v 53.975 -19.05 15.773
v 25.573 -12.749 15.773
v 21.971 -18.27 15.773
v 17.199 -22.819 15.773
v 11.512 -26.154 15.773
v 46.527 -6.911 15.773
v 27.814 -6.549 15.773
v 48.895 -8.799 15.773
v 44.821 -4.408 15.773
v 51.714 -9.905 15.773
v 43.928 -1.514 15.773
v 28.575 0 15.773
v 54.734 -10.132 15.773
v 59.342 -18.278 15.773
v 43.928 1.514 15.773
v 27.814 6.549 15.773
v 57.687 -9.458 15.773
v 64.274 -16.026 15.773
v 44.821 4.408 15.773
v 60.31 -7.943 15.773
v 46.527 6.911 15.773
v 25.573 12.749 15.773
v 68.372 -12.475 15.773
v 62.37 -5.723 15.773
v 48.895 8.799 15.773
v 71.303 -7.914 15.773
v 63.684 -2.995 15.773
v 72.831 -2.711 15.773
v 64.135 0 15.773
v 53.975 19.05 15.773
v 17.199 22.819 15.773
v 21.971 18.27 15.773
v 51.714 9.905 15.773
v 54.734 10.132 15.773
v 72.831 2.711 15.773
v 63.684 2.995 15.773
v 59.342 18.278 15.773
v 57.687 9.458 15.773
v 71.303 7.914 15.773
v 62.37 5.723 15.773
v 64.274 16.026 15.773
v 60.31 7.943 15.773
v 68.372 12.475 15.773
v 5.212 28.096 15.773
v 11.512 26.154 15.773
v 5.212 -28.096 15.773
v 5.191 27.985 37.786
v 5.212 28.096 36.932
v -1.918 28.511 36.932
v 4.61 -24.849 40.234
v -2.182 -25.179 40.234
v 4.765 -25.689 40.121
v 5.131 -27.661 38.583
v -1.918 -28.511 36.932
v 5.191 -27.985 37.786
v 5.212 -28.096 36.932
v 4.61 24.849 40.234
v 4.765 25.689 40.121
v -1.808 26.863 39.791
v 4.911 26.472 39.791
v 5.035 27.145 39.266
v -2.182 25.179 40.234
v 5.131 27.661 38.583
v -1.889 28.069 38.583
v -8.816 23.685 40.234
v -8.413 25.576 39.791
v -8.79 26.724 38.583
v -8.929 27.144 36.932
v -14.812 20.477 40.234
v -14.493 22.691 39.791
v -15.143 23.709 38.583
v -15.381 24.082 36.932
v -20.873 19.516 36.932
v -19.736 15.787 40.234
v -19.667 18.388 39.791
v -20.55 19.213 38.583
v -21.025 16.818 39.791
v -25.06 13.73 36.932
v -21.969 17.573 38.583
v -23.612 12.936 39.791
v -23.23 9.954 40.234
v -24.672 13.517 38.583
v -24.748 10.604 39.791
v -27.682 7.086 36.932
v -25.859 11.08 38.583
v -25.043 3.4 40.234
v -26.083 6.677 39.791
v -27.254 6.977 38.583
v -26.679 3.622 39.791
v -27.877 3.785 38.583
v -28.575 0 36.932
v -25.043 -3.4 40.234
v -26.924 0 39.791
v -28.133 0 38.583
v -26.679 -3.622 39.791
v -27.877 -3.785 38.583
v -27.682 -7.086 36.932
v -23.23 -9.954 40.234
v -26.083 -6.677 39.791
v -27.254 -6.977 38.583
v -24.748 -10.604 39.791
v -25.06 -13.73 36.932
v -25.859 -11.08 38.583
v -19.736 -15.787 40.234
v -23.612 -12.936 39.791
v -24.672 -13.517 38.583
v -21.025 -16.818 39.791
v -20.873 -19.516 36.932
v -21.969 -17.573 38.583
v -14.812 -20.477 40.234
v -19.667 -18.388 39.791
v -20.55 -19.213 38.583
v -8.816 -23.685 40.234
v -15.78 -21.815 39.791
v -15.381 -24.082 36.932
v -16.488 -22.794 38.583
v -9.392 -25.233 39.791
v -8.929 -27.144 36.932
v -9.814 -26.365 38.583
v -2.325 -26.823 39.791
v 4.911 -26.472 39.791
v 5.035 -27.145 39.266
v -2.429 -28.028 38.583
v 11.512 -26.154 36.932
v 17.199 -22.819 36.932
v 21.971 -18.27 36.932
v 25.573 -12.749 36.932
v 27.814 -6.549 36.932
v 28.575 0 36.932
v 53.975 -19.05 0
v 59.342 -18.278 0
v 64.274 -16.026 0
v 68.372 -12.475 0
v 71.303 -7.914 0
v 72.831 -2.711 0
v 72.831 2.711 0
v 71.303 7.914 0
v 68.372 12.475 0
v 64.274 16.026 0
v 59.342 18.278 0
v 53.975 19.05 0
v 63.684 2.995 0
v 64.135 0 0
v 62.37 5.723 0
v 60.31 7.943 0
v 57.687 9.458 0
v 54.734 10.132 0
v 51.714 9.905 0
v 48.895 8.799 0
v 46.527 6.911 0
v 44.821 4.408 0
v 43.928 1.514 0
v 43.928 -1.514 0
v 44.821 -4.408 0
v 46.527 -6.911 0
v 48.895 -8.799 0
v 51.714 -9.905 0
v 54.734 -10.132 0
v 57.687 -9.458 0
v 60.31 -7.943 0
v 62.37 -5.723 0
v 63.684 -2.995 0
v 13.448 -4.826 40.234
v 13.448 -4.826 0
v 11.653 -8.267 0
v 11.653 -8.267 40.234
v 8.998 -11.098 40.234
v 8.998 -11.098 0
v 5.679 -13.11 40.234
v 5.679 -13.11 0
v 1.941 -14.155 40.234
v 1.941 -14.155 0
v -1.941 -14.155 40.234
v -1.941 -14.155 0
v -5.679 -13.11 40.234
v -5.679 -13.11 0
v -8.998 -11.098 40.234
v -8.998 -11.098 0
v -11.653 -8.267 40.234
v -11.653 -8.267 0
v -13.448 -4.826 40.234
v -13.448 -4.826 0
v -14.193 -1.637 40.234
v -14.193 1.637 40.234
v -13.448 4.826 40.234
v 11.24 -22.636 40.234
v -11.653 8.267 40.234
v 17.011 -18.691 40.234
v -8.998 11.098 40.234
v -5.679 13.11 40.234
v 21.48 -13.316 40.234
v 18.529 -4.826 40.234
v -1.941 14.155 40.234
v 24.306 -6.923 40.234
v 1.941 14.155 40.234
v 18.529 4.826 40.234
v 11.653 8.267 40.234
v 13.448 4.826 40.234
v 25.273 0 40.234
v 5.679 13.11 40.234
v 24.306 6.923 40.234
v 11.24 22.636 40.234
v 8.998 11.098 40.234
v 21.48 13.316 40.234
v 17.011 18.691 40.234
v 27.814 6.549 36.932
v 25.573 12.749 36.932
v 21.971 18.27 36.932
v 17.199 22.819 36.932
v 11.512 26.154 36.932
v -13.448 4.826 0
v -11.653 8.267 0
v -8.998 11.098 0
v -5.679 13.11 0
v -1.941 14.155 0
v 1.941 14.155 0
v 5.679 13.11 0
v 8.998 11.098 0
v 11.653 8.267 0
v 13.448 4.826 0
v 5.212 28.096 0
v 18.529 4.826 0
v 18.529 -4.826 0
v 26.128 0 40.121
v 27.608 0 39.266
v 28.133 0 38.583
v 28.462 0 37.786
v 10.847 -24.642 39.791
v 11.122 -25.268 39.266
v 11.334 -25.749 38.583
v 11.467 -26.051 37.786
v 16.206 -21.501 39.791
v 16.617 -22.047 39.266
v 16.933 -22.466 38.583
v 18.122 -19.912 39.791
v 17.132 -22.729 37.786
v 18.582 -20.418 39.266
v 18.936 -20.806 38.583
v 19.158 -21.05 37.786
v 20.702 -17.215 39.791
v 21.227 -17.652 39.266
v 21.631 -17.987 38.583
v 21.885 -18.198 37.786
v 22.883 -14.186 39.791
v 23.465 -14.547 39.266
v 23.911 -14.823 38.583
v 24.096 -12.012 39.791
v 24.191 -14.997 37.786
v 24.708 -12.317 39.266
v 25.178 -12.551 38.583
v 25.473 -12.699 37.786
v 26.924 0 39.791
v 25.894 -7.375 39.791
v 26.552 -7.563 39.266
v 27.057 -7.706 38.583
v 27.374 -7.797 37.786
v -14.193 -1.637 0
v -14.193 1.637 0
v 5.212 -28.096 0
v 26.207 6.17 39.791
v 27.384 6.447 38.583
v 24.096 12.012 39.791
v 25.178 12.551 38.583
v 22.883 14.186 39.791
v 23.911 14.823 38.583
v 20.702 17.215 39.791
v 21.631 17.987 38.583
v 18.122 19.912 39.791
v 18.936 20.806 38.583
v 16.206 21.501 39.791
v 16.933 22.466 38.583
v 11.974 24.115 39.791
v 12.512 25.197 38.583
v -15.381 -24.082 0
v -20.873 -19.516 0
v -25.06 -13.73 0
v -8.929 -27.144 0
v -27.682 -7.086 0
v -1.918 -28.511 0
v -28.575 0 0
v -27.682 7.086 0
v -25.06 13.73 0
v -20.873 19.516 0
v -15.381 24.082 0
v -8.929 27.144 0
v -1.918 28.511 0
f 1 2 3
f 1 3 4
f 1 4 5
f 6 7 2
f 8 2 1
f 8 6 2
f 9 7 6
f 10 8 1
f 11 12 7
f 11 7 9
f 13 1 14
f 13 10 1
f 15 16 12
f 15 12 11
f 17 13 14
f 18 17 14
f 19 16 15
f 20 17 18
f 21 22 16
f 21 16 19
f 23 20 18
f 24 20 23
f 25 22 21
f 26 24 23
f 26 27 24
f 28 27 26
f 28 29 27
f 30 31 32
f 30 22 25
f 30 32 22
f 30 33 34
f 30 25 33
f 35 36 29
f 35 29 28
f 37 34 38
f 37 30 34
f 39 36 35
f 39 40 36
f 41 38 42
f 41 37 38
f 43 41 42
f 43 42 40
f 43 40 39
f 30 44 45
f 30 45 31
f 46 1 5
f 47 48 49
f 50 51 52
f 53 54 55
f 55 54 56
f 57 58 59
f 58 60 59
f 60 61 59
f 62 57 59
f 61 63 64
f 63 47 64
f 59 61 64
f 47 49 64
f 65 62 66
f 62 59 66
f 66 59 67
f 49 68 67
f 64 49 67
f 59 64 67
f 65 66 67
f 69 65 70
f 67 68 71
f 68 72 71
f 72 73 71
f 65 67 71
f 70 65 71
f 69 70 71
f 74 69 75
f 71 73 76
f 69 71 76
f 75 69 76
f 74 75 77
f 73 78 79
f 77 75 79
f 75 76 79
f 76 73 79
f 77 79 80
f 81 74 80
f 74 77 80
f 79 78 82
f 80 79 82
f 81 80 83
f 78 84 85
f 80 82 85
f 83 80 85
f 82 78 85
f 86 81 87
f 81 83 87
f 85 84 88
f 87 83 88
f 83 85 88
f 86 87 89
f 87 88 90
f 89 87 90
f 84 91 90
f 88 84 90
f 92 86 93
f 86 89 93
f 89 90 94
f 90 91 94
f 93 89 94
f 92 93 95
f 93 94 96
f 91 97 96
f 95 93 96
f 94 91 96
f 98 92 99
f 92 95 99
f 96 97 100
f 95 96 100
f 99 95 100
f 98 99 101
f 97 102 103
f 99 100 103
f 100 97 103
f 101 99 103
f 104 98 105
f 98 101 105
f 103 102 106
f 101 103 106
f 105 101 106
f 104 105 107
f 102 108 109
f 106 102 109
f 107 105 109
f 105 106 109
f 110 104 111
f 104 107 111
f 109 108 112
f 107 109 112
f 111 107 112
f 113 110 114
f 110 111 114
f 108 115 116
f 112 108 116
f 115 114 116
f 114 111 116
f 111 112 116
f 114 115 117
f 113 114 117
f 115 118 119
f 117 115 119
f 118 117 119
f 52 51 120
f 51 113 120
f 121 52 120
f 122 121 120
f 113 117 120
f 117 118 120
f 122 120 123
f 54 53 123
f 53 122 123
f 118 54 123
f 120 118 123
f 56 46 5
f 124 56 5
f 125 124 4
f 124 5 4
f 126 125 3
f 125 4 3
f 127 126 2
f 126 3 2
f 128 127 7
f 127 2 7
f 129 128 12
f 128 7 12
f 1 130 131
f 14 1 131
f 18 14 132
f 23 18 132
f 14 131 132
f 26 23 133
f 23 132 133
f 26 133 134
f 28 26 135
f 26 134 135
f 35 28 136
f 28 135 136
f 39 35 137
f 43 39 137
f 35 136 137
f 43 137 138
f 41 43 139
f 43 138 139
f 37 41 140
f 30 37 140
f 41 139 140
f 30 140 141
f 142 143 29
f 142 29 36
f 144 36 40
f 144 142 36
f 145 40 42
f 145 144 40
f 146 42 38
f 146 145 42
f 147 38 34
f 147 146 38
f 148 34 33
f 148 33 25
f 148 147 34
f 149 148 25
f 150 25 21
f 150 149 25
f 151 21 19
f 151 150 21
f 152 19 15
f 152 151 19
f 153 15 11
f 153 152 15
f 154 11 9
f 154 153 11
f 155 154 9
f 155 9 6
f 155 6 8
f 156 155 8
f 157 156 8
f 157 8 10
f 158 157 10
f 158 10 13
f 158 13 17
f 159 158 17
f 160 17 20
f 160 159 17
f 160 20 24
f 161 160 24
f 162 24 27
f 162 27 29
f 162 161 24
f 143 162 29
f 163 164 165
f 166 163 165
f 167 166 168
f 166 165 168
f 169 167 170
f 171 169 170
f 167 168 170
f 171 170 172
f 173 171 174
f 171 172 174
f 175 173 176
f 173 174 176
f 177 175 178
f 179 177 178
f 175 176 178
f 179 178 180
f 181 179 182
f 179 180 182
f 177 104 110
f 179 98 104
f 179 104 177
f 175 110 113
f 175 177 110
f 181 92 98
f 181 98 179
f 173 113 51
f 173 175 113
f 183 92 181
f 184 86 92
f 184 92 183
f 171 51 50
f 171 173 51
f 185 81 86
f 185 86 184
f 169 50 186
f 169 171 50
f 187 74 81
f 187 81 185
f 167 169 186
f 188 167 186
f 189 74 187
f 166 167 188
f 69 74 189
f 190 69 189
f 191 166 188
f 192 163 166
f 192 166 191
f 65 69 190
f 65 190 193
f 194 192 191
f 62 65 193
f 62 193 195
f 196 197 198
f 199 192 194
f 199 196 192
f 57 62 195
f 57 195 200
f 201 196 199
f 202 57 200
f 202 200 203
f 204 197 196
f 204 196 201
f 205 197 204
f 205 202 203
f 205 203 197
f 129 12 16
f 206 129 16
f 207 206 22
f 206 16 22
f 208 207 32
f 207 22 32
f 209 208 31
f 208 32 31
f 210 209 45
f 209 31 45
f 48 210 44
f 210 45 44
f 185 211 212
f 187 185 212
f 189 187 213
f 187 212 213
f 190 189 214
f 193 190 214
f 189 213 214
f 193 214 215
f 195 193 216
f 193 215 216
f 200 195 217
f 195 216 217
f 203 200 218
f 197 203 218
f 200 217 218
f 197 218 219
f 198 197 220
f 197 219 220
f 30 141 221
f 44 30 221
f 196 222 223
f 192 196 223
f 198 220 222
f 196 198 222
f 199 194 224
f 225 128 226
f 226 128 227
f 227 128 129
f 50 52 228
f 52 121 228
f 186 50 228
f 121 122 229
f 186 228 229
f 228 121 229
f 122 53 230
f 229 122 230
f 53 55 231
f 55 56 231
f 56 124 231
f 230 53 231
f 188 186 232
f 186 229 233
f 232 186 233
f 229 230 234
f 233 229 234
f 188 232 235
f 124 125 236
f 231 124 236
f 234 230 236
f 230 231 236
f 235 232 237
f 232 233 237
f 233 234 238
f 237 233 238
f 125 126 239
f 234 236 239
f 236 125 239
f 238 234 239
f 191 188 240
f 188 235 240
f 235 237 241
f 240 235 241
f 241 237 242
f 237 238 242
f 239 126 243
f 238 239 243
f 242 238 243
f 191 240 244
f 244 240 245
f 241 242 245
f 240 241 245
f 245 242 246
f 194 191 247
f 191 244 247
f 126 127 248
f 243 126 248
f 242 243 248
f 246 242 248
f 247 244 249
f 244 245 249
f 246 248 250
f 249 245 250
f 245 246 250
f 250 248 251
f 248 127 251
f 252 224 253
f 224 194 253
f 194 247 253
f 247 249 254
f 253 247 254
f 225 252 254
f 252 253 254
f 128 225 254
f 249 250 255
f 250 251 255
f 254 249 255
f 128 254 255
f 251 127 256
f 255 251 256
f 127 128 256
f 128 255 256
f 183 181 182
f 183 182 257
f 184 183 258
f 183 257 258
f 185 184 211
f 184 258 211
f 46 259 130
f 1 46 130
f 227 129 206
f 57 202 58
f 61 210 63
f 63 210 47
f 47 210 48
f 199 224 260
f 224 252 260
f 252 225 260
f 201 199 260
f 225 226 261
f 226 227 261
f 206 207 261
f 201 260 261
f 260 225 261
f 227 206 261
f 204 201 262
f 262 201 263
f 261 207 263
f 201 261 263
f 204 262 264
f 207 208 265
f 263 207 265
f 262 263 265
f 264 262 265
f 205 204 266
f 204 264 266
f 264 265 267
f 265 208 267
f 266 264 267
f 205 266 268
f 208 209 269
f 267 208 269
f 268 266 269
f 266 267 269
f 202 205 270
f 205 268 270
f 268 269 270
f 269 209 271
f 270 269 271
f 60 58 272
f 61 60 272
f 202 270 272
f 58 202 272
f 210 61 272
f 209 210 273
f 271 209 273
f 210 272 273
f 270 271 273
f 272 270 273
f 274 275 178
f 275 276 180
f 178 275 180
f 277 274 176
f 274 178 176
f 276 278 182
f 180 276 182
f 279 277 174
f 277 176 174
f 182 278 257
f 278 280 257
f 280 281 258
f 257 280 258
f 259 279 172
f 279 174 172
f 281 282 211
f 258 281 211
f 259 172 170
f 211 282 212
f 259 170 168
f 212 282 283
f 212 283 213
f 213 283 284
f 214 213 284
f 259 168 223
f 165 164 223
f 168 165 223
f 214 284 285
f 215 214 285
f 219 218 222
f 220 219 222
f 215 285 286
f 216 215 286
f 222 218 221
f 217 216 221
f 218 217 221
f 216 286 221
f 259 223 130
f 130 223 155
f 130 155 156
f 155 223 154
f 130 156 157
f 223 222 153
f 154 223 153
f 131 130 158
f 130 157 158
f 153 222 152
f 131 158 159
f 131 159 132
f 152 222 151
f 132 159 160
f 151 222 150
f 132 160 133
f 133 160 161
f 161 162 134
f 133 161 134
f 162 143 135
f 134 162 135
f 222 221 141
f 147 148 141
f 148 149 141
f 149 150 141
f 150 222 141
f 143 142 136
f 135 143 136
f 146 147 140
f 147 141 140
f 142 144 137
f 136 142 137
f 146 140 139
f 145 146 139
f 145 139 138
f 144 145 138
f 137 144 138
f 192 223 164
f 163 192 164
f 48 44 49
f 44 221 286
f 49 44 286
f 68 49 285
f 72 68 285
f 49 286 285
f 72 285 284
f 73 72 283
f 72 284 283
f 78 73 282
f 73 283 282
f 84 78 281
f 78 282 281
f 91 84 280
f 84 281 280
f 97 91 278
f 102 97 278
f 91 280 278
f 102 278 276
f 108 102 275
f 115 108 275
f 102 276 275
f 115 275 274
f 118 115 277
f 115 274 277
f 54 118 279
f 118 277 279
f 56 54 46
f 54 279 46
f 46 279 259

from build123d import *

# Parameters (mm, degrees)
F1_DEPTH = 40.2336
F0_R     = 10.16
F2_DEPTH = 15.7734
F3_R     = 3.302


with BuildPart() as f1:
    # F0 (on Top) → F1 (new body)
    with BuildSketch(Plane.XY):
        with BuildLine():
            ThreePointArc((5.211817, -28.095686), (21.971098, -18.270235), (28.575, 0))
            ThreePointArc((28.575, 0), (21.971098, 18.270235), (5.211817, 28.095686))
            ThreePointArc((5.211817, 28.095686), (-28.575, 0), (5.211817, -28.095686))
        make_face()
        with BuildLine():
            ThreePointArc((-13.447765, 4.826), (0, 14.2875), (13.447765, 4.826))
            Line((13.447765, 4.826), (18.5293, 4.826))
            Line((18.5293, 4.826), (18.5293, -4.826))
            Line((18.5293, -4.826), (13.447765, -4.826))
            ThreePointArc((13.447765, -4.826), (0, -14.2875), (-13.447765, -4.826))
            Line((-13.447765, -4.826), (-18.5293, -4.826))
            Line((-18.5293, -4.826), (-18.5293, 4.826))
            Line((-18.5293, 4.826), (-13.447765, 4.826))
        make_face(mode=Mode.SUBTRACT)
        with BuildLine():
            ThreePointArc((-13.447765, -4.826), (-14.2875, 0), (-13.447765, 4.826))
            Line((-13.447765, 4.826), (-18.5293, 4.826))
            Line((-18.5293, 4.826), (-18.5293, -4.826))
            Line((-18.5293, -4.826), (-13.447765, -4.826))
        make_face()
    extrude(amount=F1_DEPTH)

    # F0 (on Top) → F2 (join)
    with BuildSketch(Plane.XY):
        with BuildLine():
            ThreePointArc((5.211817, -28.095686), (21.971098, -18.270235), (28.575, 0))
            ThreePointArc((28.575, 0), (21.971098, 18.270235), (5.211817, 28.095686))
            ThreePointArc((5.211817, 28.095686), (-28.575, 0), (5.211817, -28.095686))
        make_face()
        with BuildLine():
            ThreePointArc((-13.447765, 4.826), (0, 14.2875), (13.447765, 4.826))
            Line((13.447765, 4.826), (18.5293, 4.826))
            Line((18.5293, 4.826), (18.5293, -4.826))
            Line((18.5293, -4.826), (13.447765, -4.826))
            ThreePointArc((13.447765, -4.826), (0, -14.2875), (-13.447765, -4.826))
            Line((-13.447765, -4.826), (-18.5293, -4.826))
            Line((-18.5293, -4.826), (-18.5293, 4.826))
            Line((-18.5293, 4.826), (-13.447765, 4.826))
        make_face(mode=Mode.SUBTRACT)
        with BuildLine():
            ThreePointArc((5.211817, 28.095686), (21.971098, 18.270235), (28.575, 0))
            ThreePointArc((28.575, 0), (21.971098, -18.270235), (5.211817, -28.095686))
            Line((5.211817, -28.095686), (53.975, -19.05))
            ThreePointArc((53.975, -19.05), (73.025, 0), (53.975, 19.05))
            Line((53.975, 19.05), (5.211817, 28.095686))
        make_face()
        with Locations((53.975, 0)):
            Circle(F0_R, mode=Mode.SUBTRACT)
    extrude(amount=F2_DEPTH)

    # F3
    f3_edges = [f1.edges().sort_by_distance(p)[0] for p in [
        (-5.211817, 28.095686, 40.2336),
    ]]
    fillet(f3_edges, radius=F3_R)


solid = f1.part
